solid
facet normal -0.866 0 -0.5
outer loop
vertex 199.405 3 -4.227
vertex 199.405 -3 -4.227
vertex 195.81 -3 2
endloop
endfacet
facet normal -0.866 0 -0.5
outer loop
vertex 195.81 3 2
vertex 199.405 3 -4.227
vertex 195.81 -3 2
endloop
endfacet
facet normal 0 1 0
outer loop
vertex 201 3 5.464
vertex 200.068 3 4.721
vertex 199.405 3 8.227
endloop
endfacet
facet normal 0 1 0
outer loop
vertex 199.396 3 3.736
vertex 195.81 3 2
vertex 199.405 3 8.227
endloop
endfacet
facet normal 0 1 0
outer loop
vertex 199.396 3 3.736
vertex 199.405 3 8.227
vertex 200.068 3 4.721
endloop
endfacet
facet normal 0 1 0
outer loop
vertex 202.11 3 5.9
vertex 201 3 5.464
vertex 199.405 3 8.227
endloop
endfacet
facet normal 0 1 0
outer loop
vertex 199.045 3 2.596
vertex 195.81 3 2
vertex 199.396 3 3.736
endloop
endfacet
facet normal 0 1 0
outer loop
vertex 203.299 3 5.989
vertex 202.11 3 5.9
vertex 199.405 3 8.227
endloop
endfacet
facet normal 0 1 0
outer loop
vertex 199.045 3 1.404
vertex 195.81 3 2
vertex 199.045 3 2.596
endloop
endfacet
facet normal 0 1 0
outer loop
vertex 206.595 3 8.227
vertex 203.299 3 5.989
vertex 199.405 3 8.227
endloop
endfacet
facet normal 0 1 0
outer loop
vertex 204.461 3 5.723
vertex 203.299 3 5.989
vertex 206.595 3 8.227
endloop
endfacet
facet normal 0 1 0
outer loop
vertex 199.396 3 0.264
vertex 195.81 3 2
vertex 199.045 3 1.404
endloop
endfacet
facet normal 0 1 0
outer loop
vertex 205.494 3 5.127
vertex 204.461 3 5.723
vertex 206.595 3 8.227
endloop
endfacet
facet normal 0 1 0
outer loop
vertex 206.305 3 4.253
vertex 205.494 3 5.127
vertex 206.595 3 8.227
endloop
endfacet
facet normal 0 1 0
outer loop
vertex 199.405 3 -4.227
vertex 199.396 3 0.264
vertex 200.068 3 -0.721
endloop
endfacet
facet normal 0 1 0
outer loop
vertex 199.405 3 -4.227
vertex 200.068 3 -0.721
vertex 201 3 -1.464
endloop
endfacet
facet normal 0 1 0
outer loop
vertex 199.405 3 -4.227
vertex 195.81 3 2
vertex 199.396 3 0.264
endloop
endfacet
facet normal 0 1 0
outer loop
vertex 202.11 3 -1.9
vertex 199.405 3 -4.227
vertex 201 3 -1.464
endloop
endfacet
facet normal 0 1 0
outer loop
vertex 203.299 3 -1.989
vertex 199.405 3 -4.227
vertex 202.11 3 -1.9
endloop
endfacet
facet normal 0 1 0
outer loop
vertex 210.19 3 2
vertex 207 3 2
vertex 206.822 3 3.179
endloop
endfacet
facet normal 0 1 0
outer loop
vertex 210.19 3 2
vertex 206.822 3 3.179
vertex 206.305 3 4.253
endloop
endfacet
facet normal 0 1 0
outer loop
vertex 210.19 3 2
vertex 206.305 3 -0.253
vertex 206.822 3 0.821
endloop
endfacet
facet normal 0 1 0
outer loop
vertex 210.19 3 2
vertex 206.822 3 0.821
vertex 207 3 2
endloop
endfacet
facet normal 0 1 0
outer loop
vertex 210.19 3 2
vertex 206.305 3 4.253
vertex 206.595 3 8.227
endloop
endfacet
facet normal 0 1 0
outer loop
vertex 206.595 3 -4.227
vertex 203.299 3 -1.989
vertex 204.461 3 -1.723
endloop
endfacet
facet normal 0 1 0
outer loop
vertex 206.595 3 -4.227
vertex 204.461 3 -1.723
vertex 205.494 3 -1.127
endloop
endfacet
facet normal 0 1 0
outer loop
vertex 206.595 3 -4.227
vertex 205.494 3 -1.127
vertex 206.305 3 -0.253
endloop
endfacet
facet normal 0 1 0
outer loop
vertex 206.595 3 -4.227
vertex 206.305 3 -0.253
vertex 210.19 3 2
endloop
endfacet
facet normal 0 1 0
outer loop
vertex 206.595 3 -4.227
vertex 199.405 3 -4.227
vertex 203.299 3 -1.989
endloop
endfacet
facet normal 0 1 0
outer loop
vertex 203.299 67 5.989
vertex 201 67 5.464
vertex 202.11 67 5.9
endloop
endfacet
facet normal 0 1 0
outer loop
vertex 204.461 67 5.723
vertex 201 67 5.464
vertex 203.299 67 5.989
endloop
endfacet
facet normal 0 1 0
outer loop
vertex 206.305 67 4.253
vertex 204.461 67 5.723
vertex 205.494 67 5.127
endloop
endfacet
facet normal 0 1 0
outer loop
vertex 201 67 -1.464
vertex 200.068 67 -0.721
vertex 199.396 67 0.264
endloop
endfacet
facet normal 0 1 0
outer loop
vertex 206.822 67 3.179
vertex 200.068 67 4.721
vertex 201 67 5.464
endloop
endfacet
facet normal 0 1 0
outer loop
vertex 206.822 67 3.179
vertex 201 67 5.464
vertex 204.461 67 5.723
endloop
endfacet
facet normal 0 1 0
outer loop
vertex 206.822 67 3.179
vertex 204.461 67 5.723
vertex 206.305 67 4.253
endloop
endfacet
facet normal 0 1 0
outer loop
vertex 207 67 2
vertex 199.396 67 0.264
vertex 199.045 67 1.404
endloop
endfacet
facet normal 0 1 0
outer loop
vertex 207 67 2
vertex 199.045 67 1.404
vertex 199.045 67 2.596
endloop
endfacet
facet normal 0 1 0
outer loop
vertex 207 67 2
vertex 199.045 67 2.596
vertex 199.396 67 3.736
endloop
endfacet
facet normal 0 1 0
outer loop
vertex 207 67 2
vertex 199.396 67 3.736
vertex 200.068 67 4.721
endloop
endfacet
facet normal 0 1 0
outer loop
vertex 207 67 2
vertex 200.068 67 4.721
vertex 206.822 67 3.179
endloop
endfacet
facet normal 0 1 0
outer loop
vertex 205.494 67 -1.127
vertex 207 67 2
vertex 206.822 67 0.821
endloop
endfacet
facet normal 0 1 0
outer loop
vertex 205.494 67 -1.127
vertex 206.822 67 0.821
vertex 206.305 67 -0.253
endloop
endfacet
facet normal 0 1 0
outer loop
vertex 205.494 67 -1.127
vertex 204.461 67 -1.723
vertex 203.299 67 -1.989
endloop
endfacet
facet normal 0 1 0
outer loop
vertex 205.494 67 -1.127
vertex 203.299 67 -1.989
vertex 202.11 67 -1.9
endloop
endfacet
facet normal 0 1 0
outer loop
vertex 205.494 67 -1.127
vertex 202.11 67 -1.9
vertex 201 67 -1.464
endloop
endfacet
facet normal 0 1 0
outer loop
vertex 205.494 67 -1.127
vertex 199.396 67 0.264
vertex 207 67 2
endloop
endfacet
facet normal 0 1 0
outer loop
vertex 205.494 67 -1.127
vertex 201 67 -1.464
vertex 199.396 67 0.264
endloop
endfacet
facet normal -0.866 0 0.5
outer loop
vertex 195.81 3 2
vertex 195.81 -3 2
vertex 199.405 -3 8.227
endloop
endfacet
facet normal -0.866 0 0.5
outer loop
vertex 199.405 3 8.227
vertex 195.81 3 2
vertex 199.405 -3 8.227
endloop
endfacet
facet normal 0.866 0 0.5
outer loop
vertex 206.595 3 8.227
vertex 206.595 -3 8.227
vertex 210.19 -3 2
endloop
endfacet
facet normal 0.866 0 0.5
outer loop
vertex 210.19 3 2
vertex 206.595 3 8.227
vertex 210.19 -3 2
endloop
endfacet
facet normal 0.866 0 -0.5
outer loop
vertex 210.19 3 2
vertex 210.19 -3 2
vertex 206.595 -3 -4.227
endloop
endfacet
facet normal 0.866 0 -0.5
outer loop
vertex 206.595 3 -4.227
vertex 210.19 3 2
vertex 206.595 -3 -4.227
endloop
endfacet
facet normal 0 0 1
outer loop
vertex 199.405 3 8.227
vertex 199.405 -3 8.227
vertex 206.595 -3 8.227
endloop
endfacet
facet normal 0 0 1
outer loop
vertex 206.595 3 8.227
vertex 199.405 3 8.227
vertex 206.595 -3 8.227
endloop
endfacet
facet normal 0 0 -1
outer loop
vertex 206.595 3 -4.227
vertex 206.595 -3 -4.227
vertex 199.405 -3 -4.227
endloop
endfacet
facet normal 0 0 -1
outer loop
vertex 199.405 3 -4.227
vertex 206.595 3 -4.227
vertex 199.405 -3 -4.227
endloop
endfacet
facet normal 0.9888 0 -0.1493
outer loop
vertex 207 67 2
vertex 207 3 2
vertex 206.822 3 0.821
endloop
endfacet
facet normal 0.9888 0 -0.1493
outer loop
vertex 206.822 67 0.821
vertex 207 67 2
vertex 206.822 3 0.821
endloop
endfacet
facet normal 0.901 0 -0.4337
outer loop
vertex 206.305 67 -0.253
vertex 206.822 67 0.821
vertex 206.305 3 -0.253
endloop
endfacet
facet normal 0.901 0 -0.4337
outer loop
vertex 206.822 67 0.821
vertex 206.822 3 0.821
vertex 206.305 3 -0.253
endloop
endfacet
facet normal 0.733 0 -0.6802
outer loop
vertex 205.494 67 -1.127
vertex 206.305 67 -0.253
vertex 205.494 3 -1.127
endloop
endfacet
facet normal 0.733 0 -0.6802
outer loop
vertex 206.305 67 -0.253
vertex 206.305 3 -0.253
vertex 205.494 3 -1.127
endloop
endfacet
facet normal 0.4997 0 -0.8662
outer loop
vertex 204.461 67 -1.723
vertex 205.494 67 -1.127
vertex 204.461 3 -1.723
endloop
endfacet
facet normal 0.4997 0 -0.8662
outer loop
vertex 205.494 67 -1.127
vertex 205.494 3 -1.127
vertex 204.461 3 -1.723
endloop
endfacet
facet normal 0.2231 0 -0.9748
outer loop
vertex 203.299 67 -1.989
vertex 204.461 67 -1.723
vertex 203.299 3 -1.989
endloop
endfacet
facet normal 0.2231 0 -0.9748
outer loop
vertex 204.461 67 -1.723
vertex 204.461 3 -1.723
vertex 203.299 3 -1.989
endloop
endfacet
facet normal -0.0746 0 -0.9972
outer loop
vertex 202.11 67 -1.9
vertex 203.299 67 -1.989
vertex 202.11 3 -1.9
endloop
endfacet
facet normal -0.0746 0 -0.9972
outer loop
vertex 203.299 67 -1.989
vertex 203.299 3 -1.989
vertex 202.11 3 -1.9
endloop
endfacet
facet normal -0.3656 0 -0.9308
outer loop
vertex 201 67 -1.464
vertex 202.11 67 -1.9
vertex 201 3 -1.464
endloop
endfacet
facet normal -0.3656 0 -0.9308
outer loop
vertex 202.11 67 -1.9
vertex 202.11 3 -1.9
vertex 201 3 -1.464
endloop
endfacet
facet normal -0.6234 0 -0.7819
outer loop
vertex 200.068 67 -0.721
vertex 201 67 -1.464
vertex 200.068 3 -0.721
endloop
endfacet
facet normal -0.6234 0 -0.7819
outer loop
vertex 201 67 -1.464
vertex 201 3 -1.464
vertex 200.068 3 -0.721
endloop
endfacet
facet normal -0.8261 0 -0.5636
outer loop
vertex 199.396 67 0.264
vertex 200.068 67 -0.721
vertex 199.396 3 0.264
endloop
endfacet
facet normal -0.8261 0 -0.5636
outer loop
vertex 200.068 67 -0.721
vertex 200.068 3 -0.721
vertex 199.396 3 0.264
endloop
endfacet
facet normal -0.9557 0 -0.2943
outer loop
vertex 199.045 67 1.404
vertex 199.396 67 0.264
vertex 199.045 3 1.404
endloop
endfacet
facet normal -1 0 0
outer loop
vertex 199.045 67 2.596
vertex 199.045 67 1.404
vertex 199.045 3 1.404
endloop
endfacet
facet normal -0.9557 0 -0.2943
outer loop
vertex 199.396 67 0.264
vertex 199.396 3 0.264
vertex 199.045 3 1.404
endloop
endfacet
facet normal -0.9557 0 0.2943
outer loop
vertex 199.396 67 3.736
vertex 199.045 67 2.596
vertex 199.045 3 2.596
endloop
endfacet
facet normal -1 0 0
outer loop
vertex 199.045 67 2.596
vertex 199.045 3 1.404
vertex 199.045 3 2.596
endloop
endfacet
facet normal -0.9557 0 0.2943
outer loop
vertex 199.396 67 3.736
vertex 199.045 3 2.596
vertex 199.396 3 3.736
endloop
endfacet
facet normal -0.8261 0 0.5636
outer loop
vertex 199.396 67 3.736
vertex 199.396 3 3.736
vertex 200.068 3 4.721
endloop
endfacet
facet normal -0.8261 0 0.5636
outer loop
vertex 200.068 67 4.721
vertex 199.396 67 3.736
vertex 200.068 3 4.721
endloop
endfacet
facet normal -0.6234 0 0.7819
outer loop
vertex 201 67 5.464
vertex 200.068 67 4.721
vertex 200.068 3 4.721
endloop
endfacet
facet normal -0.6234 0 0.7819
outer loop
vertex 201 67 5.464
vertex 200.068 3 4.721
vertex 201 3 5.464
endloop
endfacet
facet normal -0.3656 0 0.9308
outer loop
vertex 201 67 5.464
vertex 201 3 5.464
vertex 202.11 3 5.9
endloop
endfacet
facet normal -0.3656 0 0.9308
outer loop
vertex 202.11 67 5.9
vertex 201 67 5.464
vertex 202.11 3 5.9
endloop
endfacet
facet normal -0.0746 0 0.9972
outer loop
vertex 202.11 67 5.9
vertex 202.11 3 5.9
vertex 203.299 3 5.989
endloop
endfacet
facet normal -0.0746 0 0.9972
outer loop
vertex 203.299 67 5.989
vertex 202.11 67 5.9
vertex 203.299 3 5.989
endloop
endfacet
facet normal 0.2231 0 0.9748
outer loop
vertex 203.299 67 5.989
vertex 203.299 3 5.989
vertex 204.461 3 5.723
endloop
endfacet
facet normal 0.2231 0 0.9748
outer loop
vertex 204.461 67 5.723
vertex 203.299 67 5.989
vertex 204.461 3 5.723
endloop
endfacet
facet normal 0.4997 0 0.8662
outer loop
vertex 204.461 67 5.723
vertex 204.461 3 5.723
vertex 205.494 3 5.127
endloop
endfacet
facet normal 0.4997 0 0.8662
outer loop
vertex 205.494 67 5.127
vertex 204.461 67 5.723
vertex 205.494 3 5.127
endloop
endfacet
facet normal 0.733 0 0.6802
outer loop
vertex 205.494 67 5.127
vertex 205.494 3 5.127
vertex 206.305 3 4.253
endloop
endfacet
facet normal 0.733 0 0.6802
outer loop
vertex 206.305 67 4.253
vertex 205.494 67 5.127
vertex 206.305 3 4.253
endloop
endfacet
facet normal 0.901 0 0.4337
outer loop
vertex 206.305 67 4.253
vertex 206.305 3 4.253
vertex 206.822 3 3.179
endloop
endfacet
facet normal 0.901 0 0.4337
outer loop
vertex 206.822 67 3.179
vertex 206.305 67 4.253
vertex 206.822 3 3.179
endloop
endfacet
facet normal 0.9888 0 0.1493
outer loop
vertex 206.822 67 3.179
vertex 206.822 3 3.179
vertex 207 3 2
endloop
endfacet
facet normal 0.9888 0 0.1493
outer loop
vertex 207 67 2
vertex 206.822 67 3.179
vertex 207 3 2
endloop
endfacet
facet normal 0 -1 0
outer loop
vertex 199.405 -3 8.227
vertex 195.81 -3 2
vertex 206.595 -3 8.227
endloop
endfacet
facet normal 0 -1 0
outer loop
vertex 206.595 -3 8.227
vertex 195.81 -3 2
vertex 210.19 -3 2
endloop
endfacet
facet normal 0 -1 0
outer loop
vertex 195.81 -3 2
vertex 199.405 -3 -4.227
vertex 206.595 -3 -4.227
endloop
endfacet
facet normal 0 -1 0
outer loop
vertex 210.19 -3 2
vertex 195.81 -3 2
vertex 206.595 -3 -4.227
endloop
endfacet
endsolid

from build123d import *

# Parameters (mm, degrees)
CYLINDER032_R             = 4
CYLINDER032_DEPTH         = 70
PRISM004_DEPTH            = 6
FUSION014_PLACEMENT_ANGLE = 90


with BuildPart() as cilindro032:
    # Cylinder032 → Cylinder032 (new body)
    with BuildSketch(Plane.XY):
        Circle(CYLINDER032_R)
    extrude(amount=CYLINDER032_DEPTH)


with BuildPart() as tornillo_m8:
    # Prism004 → Prism004 (new body)
    with BuildSketch(Plane.XY):
        Polygon((7.19, 0), (3.595, 6.226723), (-3.595, 6.226723), (-7.19, 0), (-3.595, -6.226723), (3.595, -6.226723), align=None)
    extrude(amount=PRISM004_DEPTH)

    # Fusion014: union Cilindro032
    add(cilindro032.part)


with BuildPart() as tornillo_m8_1:
    # Fusion014 placement: moved
    add(tornillo_m8.part.moved(Location((203, -3, 2))).rotate(Axis((203, -3, 2), (-1, 0, 0)), FUSION014_PLACEMENT_ANGLE))


solid = tornillo_m8_1.part
